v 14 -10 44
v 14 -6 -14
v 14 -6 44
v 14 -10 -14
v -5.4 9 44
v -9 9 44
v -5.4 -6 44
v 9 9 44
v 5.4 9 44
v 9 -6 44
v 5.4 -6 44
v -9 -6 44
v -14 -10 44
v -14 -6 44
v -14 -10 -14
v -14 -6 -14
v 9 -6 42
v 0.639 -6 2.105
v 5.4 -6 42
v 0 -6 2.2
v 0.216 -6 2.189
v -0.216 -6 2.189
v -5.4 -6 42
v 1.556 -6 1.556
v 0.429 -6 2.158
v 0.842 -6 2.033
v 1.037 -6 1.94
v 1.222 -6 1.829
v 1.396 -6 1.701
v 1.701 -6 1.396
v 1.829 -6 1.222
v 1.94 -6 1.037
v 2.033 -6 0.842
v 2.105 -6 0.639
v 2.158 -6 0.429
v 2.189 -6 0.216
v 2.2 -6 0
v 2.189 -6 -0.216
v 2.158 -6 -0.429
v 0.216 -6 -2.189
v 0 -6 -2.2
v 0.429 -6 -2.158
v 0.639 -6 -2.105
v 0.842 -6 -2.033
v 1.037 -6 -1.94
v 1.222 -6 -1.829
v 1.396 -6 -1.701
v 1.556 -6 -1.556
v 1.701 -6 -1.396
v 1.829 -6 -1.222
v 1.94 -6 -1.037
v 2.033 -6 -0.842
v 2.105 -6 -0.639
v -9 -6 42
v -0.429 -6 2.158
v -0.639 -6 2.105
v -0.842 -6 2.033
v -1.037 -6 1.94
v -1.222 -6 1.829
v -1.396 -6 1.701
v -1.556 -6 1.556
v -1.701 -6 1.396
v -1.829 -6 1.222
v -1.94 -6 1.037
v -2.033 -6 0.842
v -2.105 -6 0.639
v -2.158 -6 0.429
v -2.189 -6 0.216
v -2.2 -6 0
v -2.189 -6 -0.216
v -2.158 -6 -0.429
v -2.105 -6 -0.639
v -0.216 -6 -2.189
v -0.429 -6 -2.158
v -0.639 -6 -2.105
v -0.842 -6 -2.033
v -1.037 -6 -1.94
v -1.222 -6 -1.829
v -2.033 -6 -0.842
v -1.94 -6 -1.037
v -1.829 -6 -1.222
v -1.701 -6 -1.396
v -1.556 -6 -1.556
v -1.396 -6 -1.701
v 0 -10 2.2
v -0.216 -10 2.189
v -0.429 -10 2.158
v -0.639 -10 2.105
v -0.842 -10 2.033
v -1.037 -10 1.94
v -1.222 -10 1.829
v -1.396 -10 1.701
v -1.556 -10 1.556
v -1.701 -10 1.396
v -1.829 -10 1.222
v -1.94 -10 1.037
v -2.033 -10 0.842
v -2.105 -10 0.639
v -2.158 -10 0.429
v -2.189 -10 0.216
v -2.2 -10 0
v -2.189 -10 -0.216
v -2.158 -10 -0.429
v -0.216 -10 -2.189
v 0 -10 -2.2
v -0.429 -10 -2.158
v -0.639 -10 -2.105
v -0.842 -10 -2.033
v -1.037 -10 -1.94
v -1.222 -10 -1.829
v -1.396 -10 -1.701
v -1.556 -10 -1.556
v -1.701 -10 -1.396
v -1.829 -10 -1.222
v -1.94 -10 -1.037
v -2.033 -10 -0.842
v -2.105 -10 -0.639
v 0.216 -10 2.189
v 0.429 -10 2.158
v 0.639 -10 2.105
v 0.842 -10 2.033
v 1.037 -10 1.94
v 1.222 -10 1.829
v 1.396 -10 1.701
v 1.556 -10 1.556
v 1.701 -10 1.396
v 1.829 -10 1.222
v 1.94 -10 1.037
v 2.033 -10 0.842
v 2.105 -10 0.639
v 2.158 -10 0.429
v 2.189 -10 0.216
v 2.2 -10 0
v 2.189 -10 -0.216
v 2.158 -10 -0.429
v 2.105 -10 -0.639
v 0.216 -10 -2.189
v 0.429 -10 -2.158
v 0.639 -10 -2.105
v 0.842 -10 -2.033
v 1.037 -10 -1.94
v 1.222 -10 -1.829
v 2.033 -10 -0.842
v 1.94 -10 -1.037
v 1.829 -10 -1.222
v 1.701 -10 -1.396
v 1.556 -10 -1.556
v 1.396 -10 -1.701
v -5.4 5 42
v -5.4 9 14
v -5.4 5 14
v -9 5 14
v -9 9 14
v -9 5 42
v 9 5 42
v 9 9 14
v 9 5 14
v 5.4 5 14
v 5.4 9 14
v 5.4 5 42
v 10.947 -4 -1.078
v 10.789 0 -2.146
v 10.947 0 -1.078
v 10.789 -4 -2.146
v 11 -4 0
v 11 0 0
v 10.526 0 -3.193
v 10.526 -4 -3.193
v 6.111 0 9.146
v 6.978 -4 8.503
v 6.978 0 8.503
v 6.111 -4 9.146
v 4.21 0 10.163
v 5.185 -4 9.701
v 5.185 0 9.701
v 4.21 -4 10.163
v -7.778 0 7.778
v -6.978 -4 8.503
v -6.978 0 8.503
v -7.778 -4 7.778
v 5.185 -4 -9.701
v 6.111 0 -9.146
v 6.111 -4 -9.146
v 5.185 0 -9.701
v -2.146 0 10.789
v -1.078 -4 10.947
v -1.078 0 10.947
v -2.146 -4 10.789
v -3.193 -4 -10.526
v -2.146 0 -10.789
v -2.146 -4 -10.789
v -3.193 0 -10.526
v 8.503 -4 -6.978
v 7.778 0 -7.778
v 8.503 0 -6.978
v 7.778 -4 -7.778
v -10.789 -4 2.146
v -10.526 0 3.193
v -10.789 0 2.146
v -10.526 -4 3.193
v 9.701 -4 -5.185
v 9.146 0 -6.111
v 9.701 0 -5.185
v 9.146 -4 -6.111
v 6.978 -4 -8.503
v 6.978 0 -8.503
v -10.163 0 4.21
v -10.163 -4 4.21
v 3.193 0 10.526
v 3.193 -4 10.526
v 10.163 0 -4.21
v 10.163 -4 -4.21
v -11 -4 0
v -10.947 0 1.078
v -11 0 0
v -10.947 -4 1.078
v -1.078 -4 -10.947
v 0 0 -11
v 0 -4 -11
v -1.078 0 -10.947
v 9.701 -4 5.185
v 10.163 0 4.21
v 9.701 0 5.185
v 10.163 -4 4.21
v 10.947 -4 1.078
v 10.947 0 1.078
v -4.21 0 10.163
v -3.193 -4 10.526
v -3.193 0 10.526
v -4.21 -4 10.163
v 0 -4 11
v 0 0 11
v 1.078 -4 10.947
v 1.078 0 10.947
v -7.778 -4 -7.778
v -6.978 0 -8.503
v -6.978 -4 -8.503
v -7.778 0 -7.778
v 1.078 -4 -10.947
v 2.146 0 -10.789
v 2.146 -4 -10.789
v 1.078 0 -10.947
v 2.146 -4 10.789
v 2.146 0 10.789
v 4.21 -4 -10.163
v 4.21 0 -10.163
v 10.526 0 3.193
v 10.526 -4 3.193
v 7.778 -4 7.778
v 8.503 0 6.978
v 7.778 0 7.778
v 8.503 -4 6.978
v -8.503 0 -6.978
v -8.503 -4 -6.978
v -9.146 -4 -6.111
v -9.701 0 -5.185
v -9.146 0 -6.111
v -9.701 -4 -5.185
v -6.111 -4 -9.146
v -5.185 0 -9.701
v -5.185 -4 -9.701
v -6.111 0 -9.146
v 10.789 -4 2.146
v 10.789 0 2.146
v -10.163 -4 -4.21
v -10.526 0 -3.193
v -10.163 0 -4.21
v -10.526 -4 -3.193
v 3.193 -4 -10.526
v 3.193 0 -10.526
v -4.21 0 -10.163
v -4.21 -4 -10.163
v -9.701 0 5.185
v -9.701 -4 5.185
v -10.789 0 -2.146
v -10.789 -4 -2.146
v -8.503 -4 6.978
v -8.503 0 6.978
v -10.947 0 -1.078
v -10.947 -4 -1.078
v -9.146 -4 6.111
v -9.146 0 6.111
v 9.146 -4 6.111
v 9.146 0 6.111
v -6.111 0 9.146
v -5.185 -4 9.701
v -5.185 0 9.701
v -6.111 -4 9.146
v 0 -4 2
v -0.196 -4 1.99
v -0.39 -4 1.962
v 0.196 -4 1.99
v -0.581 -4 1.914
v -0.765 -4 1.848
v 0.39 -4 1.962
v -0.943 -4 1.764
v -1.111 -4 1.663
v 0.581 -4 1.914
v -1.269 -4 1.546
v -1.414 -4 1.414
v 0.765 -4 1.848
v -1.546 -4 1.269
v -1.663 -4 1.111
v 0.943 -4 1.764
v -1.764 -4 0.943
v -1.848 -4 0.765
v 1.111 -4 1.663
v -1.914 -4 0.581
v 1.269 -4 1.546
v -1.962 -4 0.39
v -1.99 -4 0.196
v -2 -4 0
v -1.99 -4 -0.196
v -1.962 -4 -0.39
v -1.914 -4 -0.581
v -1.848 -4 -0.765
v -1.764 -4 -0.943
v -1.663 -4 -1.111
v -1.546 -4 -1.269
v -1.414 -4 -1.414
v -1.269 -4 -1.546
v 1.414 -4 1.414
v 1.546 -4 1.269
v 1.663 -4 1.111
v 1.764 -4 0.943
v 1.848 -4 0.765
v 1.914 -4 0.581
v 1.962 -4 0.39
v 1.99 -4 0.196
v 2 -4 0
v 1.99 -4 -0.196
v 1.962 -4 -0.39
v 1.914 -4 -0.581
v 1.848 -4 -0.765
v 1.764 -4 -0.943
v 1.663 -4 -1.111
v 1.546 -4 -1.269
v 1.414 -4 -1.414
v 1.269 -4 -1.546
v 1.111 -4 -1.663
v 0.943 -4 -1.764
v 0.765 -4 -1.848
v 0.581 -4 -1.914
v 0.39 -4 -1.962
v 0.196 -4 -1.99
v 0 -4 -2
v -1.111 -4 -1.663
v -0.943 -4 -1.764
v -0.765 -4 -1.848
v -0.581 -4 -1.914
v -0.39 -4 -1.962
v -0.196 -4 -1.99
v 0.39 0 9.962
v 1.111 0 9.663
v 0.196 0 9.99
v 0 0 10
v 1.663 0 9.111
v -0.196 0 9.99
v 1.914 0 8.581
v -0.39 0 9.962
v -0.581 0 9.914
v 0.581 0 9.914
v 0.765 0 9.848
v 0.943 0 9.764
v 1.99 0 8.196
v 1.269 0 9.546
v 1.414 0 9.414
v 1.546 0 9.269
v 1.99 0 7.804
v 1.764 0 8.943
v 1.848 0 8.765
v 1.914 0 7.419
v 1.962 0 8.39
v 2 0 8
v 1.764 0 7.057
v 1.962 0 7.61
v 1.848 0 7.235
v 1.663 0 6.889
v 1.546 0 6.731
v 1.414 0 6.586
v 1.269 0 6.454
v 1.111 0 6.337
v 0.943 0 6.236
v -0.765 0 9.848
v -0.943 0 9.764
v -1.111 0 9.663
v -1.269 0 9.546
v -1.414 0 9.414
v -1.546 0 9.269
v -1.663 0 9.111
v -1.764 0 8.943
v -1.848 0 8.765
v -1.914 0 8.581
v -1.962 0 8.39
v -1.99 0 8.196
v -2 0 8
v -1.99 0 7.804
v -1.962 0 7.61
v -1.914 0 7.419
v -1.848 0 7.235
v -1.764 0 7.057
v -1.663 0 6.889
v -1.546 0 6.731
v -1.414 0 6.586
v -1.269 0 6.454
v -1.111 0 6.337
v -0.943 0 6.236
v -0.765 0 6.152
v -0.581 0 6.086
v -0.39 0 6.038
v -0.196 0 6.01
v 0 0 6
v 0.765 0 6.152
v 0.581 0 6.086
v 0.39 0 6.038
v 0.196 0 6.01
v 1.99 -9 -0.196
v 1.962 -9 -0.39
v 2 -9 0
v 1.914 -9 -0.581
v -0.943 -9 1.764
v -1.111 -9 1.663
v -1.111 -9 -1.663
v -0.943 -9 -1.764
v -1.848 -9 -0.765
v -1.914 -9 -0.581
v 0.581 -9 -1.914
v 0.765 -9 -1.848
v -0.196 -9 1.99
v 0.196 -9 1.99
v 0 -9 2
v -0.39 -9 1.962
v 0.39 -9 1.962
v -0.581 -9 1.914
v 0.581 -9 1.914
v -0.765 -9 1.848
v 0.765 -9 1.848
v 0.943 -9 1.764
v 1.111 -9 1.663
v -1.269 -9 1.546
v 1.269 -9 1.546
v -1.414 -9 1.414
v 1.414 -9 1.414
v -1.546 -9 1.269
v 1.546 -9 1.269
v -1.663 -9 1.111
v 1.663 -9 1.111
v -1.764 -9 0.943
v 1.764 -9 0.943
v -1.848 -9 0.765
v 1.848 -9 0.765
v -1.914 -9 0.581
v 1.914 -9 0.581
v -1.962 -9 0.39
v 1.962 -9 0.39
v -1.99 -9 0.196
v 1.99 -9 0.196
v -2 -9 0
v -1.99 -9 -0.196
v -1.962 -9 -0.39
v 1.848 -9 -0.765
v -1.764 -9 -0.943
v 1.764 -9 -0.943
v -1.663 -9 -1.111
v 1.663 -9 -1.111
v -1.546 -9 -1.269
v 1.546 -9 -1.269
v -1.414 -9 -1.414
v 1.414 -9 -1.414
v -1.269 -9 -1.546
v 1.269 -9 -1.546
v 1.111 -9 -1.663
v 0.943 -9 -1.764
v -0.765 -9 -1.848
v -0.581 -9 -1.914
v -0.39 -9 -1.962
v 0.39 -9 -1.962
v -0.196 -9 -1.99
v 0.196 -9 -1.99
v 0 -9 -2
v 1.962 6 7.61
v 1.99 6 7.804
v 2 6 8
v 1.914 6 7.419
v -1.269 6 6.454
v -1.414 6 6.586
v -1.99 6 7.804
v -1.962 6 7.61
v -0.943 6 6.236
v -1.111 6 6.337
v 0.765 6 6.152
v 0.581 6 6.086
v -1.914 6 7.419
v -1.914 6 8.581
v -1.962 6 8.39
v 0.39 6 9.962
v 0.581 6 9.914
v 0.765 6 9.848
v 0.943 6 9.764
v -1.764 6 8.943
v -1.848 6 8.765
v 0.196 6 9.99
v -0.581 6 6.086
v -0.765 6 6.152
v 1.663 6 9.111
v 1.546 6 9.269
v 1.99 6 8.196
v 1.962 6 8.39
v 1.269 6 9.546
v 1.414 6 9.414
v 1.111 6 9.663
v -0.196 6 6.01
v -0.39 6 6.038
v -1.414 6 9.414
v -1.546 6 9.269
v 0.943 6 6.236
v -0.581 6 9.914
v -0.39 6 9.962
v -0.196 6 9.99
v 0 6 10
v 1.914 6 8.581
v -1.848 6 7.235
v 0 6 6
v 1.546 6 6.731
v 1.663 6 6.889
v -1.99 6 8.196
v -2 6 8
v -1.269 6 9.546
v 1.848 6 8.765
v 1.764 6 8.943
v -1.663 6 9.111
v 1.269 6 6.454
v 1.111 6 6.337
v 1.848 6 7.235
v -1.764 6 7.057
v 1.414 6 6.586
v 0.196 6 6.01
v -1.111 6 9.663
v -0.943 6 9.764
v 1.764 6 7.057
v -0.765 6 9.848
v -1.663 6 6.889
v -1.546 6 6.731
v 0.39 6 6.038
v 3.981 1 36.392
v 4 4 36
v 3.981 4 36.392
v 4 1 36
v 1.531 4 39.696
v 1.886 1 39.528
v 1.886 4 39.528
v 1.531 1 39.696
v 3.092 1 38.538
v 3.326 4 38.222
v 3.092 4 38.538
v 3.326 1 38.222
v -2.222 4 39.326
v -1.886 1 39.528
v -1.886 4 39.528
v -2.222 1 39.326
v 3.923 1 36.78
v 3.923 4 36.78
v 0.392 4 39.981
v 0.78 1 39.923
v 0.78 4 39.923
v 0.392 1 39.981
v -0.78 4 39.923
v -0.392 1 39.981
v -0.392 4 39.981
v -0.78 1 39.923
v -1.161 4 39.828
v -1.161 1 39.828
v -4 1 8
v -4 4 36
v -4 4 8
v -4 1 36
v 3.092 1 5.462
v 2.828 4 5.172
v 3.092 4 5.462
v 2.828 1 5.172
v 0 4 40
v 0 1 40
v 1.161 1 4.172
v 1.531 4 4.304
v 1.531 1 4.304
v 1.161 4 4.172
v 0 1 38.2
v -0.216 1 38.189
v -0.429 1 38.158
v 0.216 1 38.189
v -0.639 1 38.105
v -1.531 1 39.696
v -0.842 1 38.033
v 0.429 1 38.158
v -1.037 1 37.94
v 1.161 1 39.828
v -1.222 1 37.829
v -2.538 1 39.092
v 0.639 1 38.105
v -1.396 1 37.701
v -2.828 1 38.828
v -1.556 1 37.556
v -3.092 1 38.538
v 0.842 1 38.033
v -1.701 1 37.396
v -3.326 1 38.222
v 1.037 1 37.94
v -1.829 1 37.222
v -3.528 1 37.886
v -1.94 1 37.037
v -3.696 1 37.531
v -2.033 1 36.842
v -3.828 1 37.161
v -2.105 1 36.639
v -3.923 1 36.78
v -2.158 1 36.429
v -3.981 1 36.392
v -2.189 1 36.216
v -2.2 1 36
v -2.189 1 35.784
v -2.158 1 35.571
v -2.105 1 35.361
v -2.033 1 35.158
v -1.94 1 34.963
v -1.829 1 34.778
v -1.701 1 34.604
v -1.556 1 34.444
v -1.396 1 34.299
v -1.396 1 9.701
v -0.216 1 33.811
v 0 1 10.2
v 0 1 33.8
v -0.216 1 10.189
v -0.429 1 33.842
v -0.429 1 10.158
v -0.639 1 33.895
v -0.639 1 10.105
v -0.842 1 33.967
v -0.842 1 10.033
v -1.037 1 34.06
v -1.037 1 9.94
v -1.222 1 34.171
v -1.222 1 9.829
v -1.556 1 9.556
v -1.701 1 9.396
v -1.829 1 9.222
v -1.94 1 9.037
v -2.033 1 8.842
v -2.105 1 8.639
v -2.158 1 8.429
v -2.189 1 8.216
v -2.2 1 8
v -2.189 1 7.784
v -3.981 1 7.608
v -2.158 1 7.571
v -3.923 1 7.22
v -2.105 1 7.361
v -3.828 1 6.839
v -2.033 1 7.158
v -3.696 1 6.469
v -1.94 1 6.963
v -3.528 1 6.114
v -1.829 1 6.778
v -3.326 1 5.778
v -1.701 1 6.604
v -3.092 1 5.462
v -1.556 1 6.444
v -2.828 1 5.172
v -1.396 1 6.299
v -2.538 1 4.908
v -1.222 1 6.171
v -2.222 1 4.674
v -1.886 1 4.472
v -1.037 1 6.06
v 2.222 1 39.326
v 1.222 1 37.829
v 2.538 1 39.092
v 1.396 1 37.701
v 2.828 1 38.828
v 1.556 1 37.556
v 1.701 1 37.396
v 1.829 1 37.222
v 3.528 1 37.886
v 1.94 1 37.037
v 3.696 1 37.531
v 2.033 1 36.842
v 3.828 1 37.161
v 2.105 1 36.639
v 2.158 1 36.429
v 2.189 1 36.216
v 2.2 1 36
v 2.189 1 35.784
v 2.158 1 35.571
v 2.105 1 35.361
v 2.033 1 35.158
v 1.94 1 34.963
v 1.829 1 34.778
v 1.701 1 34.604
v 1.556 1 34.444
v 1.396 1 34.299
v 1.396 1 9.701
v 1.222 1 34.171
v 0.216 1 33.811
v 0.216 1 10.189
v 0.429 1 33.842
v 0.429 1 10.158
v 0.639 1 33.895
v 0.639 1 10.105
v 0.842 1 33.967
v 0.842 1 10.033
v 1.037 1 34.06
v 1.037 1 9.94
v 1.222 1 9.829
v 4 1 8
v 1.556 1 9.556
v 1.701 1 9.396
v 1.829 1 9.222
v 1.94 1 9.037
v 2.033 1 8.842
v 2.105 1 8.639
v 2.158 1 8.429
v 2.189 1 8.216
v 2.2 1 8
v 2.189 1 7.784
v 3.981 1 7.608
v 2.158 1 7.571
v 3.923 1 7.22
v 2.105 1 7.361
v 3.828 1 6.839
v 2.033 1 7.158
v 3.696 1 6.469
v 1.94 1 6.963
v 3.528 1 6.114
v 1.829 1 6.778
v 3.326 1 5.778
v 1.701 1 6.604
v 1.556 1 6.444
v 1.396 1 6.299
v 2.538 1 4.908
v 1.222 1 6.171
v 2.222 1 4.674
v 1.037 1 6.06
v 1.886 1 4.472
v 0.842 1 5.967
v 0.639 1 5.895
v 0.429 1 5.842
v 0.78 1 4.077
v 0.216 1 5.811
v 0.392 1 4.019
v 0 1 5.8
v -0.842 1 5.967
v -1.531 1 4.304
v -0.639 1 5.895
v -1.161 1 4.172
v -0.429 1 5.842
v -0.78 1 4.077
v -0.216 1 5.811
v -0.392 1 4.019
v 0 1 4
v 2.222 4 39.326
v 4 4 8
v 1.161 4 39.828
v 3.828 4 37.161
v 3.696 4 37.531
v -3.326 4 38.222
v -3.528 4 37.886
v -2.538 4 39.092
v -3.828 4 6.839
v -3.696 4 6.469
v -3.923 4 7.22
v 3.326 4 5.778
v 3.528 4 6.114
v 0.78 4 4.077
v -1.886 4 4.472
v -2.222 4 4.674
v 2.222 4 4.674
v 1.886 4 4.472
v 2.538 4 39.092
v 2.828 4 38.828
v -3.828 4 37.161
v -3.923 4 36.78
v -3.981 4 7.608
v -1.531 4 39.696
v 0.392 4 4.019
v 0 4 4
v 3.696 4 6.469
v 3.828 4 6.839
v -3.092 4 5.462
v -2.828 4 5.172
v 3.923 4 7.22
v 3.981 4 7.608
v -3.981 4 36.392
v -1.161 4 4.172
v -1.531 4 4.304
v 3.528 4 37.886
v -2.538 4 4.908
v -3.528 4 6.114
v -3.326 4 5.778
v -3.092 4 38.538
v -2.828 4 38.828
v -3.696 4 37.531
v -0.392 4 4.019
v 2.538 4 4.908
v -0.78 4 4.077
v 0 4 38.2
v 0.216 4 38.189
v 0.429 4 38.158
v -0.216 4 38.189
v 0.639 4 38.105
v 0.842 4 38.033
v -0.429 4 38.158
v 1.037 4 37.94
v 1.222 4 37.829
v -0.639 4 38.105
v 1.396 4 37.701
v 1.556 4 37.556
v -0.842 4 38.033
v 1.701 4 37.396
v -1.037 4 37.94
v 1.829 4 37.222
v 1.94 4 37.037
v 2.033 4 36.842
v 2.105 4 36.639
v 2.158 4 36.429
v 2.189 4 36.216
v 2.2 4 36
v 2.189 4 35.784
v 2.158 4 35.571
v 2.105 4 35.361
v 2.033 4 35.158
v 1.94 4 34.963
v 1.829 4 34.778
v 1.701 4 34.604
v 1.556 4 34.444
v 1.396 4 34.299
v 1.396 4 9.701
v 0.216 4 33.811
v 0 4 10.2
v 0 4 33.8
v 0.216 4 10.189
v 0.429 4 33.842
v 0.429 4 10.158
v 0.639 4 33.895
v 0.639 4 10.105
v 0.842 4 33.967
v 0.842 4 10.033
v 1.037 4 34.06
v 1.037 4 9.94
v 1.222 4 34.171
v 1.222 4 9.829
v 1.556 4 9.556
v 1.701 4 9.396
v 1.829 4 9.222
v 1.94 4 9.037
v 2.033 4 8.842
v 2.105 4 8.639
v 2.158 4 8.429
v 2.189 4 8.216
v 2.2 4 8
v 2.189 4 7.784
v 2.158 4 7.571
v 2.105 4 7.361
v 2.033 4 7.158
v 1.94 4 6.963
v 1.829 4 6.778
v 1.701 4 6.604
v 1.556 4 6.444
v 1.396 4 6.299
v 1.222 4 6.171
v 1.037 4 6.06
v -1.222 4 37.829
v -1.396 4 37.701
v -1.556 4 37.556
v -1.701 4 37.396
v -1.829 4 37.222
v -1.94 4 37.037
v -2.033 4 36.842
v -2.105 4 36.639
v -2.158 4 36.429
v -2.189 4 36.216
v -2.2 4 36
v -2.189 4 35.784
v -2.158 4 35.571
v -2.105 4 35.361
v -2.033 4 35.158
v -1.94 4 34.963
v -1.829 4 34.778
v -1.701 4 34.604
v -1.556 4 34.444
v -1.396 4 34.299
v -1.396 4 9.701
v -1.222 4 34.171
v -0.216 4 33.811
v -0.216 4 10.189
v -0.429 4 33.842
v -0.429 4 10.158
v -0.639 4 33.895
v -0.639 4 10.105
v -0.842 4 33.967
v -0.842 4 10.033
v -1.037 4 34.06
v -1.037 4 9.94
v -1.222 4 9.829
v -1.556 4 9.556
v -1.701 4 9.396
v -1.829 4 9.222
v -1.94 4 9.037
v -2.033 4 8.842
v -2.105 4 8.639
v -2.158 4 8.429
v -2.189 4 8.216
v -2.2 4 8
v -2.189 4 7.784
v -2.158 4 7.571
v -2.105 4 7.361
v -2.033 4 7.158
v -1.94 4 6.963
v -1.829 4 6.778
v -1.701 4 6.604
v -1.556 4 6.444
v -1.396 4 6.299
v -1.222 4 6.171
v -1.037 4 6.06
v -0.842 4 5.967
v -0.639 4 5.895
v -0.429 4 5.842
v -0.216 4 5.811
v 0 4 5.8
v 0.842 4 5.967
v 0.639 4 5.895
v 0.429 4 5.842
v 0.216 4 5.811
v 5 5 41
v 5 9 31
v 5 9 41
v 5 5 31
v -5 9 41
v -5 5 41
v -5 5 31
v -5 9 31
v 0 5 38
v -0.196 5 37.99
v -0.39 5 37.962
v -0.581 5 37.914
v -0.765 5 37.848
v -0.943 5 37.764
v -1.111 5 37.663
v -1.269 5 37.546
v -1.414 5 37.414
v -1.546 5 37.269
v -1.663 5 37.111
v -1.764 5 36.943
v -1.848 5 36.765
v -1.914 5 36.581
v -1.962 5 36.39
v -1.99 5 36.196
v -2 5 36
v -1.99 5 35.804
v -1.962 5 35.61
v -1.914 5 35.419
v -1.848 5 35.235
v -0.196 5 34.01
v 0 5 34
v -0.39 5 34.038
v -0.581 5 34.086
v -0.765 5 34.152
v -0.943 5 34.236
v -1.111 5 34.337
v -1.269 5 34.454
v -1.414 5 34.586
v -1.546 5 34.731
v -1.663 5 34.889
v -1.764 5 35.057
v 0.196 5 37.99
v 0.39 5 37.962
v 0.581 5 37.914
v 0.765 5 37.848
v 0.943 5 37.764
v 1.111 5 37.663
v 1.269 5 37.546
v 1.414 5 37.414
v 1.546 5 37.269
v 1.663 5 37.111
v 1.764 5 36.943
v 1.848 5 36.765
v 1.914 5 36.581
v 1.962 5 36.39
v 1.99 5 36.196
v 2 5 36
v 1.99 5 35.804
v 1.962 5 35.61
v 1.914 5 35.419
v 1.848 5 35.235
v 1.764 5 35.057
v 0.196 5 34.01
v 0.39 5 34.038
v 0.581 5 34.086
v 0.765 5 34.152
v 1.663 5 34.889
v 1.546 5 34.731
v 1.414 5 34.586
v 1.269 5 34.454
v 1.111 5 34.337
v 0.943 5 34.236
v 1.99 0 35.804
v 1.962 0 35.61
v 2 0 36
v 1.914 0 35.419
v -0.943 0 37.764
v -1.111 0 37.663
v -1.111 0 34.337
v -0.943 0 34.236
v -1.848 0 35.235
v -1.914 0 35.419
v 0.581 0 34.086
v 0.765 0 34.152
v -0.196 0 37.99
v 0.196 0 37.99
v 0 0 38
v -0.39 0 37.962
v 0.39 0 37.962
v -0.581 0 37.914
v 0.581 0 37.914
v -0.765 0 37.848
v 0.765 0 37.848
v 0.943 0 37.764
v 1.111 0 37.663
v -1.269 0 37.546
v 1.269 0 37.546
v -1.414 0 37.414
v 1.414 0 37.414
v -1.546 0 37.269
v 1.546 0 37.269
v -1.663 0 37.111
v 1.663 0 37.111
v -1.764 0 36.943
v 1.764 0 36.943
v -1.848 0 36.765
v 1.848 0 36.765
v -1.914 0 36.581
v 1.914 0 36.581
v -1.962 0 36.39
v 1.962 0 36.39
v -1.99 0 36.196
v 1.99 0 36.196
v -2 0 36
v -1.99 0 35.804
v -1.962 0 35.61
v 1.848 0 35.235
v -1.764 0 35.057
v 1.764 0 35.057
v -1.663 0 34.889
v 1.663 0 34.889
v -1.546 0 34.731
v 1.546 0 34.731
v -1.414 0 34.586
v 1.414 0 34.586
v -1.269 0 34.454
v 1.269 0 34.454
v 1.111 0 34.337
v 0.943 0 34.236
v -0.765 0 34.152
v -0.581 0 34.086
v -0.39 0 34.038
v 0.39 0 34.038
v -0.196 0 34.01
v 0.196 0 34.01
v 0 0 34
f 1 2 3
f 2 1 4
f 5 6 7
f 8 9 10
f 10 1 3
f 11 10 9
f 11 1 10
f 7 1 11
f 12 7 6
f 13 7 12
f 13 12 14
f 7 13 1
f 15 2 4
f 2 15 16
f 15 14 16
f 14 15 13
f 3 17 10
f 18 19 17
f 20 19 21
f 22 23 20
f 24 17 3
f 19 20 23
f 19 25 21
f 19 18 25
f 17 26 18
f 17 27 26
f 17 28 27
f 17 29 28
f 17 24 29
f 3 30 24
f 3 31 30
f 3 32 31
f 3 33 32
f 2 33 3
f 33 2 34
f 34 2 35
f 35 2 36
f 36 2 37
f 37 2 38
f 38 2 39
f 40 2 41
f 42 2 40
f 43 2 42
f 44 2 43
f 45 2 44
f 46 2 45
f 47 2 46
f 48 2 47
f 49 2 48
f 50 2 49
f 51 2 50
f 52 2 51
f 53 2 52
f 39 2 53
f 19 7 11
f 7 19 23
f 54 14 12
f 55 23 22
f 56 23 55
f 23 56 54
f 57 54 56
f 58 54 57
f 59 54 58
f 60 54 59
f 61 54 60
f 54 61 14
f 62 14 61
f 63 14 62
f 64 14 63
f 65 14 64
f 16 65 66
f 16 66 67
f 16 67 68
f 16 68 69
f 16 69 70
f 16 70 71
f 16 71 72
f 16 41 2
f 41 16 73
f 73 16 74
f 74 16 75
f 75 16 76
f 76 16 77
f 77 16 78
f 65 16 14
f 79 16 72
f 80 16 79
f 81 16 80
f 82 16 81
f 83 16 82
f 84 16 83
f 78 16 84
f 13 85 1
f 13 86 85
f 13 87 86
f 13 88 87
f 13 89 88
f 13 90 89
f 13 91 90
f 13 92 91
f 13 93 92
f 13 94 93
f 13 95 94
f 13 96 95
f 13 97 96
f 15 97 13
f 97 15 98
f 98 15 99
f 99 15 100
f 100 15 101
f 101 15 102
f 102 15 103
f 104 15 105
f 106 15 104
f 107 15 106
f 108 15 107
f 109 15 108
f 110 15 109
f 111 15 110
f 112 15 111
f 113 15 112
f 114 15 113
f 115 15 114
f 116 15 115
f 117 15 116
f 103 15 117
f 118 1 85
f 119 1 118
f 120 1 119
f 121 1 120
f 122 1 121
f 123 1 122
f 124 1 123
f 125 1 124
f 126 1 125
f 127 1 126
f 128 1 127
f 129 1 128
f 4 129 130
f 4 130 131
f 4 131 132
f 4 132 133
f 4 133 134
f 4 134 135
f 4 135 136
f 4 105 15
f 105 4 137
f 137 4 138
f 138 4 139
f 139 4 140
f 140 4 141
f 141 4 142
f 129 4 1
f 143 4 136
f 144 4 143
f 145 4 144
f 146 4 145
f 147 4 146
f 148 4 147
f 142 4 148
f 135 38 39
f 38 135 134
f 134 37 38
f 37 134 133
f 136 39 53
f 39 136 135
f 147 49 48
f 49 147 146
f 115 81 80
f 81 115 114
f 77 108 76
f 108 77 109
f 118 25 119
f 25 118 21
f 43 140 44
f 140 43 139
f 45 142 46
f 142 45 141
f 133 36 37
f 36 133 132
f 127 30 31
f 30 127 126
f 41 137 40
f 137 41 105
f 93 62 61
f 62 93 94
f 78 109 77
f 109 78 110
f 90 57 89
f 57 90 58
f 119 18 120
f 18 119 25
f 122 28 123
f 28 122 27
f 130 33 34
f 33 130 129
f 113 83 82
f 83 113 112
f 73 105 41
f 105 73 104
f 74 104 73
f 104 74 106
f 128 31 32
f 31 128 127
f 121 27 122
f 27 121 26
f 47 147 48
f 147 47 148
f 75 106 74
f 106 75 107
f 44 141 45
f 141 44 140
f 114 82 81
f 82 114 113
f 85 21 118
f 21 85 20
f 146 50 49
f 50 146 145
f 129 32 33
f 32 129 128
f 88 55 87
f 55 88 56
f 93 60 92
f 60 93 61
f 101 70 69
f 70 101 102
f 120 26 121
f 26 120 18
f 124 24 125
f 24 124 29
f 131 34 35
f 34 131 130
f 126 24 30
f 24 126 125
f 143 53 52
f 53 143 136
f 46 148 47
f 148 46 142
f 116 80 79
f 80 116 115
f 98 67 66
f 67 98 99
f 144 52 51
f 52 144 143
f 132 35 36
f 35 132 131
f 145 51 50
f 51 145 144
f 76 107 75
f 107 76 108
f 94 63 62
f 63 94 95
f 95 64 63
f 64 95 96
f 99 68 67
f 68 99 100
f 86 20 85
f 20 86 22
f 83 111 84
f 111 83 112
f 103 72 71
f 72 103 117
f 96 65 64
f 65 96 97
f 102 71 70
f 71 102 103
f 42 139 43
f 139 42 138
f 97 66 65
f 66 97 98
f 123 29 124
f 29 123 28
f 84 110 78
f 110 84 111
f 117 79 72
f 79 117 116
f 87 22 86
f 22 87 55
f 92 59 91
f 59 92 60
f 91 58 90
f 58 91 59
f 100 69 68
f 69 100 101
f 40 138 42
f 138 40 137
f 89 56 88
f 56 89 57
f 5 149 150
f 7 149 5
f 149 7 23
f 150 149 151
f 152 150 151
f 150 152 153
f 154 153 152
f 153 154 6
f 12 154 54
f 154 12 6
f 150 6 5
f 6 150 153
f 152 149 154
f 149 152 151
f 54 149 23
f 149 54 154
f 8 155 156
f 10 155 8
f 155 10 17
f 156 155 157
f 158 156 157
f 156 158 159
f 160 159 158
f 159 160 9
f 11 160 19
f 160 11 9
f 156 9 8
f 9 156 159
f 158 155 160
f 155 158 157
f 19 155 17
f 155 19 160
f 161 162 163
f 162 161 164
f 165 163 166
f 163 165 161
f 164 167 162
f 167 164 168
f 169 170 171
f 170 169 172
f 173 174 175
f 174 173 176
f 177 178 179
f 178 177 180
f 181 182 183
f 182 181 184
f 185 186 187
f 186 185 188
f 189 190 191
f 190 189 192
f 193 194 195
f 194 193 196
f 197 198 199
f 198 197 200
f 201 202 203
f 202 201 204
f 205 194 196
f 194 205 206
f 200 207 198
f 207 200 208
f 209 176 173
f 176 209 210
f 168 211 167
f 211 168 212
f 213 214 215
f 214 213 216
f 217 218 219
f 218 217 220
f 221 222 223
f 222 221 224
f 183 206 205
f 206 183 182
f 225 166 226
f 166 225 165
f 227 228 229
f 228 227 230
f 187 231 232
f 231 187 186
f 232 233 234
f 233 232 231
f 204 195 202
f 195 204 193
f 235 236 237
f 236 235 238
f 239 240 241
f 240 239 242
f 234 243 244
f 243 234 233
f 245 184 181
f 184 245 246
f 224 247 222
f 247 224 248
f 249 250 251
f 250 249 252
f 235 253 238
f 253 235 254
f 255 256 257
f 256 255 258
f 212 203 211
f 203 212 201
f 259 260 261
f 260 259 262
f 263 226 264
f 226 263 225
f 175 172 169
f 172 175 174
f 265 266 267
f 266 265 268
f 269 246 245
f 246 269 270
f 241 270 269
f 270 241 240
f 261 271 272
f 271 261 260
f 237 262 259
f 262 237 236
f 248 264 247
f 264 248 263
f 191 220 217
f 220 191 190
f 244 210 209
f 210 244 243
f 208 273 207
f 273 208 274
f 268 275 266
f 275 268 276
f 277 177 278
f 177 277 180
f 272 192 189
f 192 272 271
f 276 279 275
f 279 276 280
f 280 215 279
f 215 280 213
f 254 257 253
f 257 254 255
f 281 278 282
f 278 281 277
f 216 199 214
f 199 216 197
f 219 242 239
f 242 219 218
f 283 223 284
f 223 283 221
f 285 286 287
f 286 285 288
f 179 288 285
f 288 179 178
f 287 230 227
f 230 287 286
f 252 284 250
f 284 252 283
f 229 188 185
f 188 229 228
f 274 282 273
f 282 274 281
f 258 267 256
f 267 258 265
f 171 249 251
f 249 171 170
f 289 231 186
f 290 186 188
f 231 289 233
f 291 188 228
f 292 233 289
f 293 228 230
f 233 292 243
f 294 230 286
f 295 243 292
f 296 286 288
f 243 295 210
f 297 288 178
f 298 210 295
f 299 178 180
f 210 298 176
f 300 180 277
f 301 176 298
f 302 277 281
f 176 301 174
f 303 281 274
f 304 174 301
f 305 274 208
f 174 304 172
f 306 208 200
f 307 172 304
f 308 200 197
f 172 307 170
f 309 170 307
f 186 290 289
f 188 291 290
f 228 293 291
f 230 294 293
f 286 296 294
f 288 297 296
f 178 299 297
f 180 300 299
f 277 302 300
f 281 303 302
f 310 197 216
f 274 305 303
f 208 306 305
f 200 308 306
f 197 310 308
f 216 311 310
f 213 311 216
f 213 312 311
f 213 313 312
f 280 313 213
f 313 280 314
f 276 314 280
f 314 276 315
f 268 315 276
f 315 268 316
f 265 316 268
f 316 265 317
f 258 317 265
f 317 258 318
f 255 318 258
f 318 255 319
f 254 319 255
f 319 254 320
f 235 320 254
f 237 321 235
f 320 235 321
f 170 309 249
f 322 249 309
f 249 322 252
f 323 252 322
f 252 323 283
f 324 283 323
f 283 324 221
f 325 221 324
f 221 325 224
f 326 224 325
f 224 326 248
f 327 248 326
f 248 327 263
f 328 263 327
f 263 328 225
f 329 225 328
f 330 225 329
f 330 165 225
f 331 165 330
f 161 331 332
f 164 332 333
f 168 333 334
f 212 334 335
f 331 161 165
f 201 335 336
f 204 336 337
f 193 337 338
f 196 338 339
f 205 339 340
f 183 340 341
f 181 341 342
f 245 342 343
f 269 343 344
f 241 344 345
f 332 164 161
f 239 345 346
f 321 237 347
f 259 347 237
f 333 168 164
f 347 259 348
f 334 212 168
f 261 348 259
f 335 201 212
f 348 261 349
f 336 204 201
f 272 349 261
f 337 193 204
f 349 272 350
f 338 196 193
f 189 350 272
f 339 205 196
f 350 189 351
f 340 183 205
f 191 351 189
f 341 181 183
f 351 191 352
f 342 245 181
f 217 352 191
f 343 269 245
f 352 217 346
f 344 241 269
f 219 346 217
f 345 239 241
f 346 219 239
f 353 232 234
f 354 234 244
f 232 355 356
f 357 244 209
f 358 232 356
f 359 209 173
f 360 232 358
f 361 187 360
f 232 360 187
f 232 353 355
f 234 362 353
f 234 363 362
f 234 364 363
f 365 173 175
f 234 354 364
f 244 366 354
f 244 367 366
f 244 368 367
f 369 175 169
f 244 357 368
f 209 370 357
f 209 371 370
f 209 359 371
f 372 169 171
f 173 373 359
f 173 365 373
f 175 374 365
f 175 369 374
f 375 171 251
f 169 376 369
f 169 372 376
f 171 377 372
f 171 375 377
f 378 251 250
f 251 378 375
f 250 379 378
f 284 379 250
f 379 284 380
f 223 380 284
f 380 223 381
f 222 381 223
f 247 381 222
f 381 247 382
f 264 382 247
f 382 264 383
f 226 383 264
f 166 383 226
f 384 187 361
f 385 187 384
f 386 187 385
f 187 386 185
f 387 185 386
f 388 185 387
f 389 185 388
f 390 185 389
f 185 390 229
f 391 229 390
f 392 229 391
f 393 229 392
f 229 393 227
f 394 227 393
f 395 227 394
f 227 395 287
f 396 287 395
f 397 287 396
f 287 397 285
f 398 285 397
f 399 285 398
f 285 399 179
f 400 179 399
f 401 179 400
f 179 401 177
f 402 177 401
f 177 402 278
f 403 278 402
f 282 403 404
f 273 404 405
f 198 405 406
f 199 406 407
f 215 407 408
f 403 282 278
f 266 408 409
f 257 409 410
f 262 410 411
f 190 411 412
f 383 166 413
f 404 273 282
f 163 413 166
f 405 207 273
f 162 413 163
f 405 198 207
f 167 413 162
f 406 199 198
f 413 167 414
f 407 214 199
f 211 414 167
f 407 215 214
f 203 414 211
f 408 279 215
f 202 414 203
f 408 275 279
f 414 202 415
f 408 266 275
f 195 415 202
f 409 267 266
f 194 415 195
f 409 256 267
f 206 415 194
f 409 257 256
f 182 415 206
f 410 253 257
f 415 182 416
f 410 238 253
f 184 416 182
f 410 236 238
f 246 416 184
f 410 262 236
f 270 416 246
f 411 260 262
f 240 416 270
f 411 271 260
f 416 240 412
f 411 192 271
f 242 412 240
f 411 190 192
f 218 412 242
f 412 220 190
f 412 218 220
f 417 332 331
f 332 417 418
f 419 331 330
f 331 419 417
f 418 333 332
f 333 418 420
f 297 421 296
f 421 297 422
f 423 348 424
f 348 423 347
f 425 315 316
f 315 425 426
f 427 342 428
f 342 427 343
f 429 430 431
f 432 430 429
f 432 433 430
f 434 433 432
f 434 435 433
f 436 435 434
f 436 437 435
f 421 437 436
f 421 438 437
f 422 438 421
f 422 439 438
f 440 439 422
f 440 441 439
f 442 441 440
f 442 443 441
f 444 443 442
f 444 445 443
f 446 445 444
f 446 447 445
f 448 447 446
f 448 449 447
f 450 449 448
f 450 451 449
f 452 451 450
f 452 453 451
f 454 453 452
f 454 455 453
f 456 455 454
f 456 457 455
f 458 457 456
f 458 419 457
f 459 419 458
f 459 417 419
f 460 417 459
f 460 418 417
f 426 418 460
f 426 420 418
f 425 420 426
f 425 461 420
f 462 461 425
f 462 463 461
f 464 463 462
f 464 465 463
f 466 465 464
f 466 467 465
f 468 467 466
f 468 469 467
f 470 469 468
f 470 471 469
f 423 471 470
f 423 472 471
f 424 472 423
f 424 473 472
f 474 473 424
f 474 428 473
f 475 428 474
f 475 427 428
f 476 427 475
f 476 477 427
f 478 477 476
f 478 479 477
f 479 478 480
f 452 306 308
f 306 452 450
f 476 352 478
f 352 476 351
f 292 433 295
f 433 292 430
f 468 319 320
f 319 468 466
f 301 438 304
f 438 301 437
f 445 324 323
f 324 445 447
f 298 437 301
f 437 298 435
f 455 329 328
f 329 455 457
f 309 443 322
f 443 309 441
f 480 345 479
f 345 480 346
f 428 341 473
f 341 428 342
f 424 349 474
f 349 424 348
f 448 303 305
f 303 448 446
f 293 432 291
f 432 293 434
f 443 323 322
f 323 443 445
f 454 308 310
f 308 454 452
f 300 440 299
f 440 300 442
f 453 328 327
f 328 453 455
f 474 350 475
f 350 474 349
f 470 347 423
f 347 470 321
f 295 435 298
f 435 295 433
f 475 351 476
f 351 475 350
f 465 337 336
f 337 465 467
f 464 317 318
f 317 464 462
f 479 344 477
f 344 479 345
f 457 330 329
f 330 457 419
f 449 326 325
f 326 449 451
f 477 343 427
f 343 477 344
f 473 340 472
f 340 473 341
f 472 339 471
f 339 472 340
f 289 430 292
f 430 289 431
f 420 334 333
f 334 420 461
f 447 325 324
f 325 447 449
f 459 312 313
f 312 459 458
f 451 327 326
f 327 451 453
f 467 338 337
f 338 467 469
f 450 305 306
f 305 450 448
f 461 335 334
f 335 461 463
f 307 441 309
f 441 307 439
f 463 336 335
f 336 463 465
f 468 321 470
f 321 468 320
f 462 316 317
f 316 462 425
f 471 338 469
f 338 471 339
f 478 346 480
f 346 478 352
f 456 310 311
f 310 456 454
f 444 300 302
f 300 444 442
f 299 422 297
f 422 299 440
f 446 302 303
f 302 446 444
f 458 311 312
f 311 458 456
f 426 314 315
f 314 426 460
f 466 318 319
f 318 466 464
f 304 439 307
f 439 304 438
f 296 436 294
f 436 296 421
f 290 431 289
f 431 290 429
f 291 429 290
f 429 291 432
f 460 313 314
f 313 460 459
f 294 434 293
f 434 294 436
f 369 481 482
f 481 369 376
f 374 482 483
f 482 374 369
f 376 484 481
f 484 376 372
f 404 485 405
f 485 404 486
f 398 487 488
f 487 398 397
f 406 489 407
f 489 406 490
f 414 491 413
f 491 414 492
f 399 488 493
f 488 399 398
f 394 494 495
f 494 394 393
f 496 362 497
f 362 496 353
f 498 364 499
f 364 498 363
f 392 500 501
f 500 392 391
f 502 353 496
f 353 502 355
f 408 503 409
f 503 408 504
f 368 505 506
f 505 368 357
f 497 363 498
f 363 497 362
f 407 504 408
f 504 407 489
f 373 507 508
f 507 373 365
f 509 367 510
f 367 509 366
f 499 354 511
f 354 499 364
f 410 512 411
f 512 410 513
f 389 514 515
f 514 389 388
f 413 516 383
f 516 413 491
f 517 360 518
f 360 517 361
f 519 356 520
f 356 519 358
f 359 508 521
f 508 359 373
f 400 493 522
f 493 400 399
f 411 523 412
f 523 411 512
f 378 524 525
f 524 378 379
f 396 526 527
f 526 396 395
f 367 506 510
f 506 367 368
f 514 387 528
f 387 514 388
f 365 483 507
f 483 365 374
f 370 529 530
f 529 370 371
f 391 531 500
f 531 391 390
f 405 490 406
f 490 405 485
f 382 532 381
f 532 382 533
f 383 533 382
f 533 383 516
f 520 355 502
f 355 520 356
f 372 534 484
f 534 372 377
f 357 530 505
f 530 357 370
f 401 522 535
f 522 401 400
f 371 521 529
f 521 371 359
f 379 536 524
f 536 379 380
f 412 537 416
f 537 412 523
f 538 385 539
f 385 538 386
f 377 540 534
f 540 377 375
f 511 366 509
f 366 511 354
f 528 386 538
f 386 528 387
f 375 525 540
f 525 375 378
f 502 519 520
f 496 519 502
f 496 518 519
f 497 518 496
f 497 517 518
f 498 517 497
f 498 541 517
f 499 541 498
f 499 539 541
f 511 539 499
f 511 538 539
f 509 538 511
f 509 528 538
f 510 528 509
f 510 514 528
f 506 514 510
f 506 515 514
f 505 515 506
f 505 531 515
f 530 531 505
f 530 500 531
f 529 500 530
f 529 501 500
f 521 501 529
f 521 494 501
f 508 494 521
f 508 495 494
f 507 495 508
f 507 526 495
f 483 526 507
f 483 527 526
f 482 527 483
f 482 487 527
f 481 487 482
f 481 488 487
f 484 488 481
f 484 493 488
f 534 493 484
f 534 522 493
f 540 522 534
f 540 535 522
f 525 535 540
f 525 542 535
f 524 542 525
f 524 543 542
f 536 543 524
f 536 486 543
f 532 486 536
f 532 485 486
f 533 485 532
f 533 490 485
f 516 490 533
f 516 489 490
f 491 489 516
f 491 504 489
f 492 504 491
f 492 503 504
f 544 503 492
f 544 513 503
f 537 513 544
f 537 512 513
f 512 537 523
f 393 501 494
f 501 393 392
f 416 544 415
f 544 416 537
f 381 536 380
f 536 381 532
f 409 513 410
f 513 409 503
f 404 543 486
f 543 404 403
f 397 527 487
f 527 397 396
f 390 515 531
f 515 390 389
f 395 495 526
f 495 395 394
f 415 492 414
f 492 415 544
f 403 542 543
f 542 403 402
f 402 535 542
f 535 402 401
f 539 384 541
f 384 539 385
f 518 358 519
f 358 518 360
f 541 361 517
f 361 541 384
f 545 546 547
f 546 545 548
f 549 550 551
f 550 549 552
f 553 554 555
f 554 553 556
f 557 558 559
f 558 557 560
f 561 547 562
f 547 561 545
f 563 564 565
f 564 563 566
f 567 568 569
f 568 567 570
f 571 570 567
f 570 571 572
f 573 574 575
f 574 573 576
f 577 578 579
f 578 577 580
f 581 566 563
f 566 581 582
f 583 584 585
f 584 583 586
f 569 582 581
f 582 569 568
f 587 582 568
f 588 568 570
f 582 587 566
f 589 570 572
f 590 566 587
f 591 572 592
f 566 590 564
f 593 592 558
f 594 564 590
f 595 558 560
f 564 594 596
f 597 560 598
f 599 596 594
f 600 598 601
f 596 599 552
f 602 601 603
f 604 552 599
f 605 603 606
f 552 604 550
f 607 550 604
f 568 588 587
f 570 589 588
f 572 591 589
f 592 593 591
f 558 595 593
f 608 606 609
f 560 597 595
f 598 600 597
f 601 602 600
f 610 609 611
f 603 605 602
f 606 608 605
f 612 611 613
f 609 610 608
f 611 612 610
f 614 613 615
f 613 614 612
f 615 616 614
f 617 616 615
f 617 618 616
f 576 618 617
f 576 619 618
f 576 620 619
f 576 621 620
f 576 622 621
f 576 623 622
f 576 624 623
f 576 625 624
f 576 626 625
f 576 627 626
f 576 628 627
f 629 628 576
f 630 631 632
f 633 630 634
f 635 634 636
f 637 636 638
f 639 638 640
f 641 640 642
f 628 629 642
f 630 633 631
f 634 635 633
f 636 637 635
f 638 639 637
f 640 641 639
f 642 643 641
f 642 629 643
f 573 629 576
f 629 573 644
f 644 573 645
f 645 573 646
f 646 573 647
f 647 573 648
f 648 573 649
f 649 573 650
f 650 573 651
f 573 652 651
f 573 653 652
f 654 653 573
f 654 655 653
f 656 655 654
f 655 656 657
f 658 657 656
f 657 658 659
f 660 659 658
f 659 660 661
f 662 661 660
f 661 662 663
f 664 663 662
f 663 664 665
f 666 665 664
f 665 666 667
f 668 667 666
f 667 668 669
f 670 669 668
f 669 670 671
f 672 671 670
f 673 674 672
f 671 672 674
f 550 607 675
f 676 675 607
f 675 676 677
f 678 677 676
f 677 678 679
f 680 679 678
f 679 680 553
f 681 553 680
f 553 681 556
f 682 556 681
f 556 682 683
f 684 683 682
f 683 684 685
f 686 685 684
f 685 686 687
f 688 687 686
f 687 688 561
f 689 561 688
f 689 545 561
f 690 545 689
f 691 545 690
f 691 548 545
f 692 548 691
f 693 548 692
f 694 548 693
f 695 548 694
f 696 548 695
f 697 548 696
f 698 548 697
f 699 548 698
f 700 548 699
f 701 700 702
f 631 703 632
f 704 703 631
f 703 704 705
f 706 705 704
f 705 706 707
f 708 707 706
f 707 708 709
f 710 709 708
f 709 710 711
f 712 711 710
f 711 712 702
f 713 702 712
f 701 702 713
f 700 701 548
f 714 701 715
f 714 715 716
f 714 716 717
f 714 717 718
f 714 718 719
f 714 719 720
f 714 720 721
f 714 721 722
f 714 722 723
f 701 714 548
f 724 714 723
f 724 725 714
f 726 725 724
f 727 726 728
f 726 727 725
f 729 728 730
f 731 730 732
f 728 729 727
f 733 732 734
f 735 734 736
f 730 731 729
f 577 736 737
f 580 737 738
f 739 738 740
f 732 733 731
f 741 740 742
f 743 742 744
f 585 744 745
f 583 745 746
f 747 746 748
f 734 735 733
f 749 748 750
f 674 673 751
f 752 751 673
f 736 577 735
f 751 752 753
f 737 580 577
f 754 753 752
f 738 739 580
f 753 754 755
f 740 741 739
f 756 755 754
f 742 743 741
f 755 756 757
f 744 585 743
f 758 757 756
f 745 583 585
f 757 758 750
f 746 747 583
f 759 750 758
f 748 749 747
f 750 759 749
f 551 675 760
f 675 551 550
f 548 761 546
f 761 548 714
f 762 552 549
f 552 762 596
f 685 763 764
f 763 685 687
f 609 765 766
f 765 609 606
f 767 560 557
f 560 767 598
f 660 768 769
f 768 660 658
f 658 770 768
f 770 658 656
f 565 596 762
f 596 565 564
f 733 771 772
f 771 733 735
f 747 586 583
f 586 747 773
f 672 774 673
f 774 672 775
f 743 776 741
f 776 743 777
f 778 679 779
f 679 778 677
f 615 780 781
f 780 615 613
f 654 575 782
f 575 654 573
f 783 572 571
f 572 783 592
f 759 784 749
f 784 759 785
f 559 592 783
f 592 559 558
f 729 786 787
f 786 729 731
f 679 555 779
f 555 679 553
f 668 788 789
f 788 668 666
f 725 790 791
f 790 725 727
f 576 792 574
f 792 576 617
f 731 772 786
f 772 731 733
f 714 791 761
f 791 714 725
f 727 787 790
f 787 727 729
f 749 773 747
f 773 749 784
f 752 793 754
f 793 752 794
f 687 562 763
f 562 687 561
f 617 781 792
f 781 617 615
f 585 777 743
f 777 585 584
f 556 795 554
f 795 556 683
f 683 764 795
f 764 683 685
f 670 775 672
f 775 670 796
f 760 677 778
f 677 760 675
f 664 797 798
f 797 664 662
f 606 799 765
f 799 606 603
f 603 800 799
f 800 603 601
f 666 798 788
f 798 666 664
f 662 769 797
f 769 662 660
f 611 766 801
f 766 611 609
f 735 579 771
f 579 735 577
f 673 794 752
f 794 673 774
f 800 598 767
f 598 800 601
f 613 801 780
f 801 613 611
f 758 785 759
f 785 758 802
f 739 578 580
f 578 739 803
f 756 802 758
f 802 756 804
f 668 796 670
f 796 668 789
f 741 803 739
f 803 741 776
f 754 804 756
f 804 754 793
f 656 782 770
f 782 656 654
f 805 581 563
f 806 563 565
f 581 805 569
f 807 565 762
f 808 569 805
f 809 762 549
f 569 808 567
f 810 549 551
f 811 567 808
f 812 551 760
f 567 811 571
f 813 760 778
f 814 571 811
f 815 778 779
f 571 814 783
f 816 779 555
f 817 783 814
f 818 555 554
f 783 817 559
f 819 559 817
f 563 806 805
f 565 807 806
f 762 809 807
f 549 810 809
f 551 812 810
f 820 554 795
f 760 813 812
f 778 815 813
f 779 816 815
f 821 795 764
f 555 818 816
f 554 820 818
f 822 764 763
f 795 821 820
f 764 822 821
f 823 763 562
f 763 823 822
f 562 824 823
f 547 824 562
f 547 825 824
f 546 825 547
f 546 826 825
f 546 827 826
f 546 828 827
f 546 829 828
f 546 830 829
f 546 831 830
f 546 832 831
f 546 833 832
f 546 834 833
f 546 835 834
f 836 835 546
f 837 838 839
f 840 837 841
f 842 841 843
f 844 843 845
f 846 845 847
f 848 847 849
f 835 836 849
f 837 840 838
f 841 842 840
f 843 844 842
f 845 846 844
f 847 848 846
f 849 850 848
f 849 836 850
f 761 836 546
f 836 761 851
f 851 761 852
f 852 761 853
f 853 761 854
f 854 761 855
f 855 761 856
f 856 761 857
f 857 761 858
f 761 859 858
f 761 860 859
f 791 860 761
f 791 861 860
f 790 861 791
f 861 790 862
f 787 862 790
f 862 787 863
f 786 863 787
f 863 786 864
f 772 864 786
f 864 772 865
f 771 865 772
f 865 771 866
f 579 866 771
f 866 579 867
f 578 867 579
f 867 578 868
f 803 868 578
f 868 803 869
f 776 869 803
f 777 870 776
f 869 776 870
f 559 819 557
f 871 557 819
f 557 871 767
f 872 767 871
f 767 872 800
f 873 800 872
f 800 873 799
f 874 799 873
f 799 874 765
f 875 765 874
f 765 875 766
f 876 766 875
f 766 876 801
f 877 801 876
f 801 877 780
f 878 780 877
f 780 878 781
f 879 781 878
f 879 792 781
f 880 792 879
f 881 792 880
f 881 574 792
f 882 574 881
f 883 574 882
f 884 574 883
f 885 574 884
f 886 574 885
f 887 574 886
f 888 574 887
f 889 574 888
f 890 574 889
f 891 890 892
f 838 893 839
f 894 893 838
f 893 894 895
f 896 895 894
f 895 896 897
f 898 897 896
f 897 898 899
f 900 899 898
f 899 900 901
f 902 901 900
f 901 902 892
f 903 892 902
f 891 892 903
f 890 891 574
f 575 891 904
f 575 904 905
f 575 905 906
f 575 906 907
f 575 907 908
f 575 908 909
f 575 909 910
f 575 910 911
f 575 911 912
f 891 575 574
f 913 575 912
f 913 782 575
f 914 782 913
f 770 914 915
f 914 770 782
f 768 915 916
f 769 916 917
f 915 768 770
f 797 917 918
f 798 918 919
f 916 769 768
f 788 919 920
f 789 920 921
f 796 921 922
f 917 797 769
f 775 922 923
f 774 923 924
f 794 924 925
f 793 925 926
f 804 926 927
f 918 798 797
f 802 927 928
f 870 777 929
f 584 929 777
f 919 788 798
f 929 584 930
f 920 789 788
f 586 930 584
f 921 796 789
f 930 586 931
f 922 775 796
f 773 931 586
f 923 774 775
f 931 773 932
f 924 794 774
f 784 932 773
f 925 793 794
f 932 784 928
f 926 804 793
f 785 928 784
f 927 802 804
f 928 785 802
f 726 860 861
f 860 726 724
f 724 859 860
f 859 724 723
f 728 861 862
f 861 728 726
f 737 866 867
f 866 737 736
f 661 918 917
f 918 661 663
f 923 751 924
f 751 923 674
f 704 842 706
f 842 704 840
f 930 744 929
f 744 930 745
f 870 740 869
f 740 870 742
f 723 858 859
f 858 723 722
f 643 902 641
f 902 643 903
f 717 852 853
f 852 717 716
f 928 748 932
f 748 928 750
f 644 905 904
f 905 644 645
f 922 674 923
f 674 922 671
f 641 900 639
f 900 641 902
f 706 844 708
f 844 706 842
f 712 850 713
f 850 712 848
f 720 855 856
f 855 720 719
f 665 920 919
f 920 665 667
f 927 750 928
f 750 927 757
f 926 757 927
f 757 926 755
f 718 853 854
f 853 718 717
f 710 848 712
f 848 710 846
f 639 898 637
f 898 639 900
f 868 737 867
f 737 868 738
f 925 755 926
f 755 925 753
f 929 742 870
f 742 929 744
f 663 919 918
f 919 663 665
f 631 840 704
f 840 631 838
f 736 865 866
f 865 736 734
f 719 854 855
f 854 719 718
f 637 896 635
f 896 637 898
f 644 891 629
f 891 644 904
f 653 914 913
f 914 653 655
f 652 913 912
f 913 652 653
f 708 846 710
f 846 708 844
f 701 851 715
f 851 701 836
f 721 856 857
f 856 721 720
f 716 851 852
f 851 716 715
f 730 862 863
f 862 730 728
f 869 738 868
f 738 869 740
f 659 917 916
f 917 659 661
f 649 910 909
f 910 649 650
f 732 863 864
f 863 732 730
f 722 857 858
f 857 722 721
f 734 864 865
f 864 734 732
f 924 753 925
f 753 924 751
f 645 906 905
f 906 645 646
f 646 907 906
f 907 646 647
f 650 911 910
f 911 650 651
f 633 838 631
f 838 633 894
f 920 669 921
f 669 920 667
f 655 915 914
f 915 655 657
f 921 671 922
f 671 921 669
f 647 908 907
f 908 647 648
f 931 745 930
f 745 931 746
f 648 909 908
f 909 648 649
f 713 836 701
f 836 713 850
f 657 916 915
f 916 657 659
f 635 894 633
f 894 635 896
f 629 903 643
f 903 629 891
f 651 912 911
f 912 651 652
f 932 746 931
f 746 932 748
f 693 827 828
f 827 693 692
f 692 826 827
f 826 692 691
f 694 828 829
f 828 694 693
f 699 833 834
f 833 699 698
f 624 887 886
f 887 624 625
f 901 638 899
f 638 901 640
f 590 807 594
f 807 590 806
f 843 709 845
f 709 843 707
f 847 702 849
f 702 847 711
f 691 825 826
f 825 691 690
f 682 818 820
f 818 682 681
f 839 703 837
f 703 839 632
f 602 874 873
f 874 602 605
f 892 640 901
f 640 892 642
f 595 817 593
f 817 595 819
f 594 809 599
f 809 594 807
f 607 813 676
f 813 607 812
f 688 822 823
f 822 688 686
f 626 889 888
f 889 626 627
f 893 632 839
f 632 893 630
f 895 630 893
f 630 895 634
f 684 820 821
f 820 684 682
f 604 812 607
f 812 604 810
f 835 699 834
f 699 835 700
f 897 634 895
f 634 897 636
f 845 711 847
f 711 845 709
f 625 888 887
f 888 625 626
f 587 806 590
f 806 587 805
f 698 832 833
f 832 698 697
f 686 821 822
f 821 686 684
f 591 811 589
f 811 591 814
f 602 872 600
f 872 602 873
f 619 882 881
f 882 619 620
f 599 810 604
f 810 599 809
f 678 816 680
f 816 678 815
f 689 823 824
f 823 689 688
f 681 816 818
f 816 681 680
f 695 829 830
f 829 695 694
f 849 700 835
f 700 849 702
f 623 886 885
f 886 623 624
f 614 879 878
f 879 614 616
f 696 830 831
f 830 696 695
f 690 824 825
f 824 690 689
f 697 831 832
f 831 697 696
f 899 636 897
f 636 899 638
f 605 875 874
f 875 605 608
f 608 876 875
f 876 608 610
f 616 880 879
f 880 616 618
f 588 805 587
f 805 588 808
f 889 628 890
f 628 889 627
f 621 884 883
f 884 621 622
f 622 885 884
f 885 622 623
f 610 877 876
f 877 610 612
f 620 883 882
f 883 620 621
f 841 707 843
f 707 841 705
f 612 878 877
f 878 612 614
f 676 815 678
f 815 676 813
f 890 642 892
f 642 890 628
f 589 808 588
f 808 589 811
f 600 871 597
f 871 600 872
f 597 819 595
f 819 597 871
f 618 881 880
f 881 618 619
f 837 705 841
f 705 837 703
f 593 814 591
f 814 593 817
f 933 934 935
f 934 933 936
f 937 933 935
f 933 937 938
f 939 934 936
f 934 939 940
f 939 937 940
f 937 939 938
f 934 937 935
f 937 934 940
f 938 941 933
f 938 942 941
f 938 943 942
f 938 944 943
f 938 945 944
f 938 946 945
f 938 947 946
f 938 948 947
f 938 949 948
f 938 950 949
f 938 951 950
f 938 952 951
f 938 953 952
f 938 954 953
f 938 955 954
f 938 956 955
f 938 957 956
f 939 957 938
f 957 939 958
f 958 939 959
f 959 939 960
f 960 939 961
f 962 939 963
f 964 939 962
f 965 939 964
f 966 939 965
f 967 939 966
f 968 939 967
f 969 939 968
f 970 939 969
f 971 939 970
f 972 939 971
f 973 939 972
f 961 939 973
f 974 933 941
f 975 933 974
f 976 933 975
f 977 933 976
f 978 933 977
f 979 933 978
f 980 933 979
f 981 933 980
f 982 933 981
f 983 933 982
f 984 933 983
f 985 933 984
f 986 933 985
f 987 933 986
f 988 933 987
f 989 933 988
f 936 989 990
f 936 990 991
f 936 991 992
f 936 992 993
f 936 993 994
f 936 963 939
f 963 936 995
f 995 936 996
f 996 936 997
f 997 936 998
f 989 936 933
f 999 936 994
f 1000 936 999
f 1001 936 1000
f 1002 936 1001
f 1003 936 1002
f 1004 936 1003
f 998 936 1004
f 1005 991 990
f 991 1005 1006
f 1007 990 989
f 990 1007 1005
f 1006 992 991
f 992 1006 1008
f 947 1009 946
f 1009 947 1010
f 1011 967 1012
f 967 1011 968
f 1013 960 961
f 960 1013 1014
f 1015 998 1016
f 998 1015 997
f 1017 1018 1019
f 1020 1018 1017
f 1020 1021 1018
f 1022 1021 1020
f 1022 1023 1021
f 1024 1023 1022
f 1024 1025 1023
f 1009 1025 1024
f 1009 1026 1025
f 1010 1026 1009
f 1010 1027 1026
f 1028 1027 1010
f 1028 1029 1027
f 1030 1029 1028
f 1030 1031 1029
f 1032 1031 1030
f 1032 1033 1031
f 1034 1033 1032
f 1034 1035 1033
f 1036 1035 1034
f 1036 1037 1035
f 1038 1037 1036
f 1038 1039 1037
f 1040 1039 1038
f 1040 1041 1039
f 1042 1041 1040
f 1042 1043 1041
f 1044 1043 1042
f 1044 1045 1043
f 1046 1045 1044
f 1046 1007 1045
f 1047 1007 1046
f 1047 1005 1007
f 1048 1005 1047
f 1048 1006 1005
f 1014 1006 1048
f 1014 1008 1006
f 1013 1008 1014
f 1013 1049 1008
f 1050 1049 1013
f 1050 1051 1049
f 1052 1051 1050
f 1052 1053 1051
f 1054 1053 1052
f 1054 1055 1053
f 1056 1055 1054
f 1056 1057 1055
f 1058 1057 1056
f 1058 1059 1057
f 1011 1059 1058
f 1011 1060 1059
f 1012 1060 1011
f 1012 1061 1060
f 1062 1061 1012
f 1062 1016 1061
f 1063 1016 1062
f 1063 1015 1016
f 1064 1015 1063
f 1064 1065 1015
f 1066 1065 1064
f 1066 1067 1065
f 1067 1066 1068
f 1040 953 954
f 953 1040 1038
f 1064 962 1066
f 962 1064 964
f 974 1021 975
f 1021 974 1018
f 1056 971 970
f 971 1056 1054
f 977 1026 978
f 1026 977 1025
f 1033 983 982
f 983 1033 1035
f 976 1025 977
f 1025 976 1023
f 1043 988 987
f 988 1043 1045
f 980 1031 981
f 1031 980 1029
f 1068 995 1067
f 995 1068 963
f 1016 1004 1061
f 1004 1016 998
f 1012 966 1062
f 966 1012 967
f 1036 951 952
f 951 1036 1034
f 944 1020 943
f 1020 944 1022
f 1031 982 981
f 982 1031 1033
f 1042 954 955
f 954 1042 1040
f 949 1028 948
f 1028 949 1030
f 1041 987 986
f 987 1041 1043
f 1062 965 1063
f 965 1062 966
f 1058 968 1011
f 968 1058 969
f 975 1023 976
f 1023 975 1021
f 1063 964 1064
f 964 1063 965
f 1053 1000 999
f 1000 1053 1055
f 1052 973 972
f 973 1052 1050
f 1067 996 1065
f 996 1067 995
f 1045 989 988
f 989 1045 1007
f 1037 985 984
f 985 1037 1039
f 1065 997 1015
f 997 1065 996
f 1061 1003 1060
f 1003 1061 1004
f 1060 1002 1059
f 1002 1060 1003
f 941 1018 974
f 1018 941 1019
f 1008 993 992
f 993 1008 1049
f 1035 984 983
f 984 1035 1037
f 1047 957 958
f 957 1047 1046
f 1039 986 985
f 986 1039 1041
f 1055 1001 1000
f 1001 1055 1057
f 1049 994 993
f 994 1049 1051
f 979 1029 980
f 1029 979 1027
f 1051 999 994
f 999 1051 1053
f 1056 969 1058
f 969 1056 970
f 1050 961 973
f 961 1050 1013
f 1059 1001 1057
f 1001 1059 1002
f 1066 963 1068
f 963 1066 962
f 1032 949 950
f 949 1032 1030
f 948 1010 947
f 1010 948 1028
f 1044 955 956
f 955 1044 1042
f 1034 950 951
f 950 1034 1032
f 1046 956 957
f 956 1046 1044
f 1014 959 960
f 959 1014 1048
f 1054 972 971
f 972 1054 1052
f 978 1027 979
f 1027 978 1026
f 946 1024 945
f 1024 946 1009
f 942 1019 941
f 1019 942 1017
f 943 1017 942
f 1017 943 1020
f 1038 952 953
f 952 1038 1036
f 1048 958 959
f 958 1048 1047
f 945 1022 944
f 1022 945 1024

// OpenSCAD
// Original low-speed slider-crank verification fixture, millimetres.
// Four manufacturing parts. Pins are integral; external axial retention is
// required. No load capacity, print tolerance or physical function is claimed.
agentscad_part = "all";
agentscad_pose = false;
motion_angle = 0;
crank_radius = 8;
rod_length = 28;
$fn = 64;

// All pin axes are parallel to +Y; the mechanism moves in the XZ plane.
module y_cylinder(radius, height) { rotate([-90, 0, 0]) cylinder(r=radius, h=height); }
module crank_local() {
  union() {
    translate([0, -4, 0]) y_cylinder(crank_radius + 3, 4);
    translate([0, -9, 0]) y_cylinder(2, 5.1);
    translate([0, -0.1, crank_radius]) y_cylinder(2, 6.1);
  }
}
module rod_local() {
  difference() {
    hull() {
      translate([0, 1, 0]) y_cylinder(4, 3);
      translate([0, 1, rod_length]) y_cylinder(4, 3);
    }
    translate([0, 0.9, 0]) y_cylinder(2.2, 3.2);
    translate([0, 0.9, rod_length]) y_cylinder(2.2, 3.2);
  }
}
module slider_local() {
  union() {
    translate([-5, 5, -5]) cube([10, 4, 10]);
    y_cylinder(2, 5.1);
  }
}
module frame_local() {
  union() {
    difference() {
      translate([-14, -10, -14]) cube([28, 4, 58]);
      translate([0, -10.1, 0]) y_cylinder(2.2, 4.2);
    }
    for (x = [-9, 5.4]) {
      translate([x, 5, 14]) cube([3.6, 4, 30]);
      translate([x, -6.1, 42]) cube([3.6, 11.2, 2]);
    }
  }
}

// Source-side construction. The checker measures the resulting mesh contours;
// it never consumes these functions or their computed coordinates as evidence.
cx = crank_radius * sin(motion_angle);
cz = crank_radius * cos(motion_angle);
travel = sqrt(rod_length * rod_length - cx * cx);
pz = cz + travel;
rod_angle = atan2(-cx, travel);
module selected_part(id, placed) {
  if (id == "frame") frame_local();
  if (id == "crank") rotate([placed ? motion_angle : 0, 0, 0]) crank_local();
  if (id == "rod") translate(placed ? [cx, 0, cz] : [0, 0, 0])
    rotate([0, placed ? rod_angle : 0, 0]) rod_local();
  if (id == "slider") translate([0, 0, placed ? pz : 0]) slider_local();
}
module generated_part() {
  if (agentscad_part == "all") {
    for (id = ["frame", "crank", "rod", "slider"]) selected_part(id, true);
  } else selected_part(agentscad_part, agentscad_pose);
}
generated_part();
